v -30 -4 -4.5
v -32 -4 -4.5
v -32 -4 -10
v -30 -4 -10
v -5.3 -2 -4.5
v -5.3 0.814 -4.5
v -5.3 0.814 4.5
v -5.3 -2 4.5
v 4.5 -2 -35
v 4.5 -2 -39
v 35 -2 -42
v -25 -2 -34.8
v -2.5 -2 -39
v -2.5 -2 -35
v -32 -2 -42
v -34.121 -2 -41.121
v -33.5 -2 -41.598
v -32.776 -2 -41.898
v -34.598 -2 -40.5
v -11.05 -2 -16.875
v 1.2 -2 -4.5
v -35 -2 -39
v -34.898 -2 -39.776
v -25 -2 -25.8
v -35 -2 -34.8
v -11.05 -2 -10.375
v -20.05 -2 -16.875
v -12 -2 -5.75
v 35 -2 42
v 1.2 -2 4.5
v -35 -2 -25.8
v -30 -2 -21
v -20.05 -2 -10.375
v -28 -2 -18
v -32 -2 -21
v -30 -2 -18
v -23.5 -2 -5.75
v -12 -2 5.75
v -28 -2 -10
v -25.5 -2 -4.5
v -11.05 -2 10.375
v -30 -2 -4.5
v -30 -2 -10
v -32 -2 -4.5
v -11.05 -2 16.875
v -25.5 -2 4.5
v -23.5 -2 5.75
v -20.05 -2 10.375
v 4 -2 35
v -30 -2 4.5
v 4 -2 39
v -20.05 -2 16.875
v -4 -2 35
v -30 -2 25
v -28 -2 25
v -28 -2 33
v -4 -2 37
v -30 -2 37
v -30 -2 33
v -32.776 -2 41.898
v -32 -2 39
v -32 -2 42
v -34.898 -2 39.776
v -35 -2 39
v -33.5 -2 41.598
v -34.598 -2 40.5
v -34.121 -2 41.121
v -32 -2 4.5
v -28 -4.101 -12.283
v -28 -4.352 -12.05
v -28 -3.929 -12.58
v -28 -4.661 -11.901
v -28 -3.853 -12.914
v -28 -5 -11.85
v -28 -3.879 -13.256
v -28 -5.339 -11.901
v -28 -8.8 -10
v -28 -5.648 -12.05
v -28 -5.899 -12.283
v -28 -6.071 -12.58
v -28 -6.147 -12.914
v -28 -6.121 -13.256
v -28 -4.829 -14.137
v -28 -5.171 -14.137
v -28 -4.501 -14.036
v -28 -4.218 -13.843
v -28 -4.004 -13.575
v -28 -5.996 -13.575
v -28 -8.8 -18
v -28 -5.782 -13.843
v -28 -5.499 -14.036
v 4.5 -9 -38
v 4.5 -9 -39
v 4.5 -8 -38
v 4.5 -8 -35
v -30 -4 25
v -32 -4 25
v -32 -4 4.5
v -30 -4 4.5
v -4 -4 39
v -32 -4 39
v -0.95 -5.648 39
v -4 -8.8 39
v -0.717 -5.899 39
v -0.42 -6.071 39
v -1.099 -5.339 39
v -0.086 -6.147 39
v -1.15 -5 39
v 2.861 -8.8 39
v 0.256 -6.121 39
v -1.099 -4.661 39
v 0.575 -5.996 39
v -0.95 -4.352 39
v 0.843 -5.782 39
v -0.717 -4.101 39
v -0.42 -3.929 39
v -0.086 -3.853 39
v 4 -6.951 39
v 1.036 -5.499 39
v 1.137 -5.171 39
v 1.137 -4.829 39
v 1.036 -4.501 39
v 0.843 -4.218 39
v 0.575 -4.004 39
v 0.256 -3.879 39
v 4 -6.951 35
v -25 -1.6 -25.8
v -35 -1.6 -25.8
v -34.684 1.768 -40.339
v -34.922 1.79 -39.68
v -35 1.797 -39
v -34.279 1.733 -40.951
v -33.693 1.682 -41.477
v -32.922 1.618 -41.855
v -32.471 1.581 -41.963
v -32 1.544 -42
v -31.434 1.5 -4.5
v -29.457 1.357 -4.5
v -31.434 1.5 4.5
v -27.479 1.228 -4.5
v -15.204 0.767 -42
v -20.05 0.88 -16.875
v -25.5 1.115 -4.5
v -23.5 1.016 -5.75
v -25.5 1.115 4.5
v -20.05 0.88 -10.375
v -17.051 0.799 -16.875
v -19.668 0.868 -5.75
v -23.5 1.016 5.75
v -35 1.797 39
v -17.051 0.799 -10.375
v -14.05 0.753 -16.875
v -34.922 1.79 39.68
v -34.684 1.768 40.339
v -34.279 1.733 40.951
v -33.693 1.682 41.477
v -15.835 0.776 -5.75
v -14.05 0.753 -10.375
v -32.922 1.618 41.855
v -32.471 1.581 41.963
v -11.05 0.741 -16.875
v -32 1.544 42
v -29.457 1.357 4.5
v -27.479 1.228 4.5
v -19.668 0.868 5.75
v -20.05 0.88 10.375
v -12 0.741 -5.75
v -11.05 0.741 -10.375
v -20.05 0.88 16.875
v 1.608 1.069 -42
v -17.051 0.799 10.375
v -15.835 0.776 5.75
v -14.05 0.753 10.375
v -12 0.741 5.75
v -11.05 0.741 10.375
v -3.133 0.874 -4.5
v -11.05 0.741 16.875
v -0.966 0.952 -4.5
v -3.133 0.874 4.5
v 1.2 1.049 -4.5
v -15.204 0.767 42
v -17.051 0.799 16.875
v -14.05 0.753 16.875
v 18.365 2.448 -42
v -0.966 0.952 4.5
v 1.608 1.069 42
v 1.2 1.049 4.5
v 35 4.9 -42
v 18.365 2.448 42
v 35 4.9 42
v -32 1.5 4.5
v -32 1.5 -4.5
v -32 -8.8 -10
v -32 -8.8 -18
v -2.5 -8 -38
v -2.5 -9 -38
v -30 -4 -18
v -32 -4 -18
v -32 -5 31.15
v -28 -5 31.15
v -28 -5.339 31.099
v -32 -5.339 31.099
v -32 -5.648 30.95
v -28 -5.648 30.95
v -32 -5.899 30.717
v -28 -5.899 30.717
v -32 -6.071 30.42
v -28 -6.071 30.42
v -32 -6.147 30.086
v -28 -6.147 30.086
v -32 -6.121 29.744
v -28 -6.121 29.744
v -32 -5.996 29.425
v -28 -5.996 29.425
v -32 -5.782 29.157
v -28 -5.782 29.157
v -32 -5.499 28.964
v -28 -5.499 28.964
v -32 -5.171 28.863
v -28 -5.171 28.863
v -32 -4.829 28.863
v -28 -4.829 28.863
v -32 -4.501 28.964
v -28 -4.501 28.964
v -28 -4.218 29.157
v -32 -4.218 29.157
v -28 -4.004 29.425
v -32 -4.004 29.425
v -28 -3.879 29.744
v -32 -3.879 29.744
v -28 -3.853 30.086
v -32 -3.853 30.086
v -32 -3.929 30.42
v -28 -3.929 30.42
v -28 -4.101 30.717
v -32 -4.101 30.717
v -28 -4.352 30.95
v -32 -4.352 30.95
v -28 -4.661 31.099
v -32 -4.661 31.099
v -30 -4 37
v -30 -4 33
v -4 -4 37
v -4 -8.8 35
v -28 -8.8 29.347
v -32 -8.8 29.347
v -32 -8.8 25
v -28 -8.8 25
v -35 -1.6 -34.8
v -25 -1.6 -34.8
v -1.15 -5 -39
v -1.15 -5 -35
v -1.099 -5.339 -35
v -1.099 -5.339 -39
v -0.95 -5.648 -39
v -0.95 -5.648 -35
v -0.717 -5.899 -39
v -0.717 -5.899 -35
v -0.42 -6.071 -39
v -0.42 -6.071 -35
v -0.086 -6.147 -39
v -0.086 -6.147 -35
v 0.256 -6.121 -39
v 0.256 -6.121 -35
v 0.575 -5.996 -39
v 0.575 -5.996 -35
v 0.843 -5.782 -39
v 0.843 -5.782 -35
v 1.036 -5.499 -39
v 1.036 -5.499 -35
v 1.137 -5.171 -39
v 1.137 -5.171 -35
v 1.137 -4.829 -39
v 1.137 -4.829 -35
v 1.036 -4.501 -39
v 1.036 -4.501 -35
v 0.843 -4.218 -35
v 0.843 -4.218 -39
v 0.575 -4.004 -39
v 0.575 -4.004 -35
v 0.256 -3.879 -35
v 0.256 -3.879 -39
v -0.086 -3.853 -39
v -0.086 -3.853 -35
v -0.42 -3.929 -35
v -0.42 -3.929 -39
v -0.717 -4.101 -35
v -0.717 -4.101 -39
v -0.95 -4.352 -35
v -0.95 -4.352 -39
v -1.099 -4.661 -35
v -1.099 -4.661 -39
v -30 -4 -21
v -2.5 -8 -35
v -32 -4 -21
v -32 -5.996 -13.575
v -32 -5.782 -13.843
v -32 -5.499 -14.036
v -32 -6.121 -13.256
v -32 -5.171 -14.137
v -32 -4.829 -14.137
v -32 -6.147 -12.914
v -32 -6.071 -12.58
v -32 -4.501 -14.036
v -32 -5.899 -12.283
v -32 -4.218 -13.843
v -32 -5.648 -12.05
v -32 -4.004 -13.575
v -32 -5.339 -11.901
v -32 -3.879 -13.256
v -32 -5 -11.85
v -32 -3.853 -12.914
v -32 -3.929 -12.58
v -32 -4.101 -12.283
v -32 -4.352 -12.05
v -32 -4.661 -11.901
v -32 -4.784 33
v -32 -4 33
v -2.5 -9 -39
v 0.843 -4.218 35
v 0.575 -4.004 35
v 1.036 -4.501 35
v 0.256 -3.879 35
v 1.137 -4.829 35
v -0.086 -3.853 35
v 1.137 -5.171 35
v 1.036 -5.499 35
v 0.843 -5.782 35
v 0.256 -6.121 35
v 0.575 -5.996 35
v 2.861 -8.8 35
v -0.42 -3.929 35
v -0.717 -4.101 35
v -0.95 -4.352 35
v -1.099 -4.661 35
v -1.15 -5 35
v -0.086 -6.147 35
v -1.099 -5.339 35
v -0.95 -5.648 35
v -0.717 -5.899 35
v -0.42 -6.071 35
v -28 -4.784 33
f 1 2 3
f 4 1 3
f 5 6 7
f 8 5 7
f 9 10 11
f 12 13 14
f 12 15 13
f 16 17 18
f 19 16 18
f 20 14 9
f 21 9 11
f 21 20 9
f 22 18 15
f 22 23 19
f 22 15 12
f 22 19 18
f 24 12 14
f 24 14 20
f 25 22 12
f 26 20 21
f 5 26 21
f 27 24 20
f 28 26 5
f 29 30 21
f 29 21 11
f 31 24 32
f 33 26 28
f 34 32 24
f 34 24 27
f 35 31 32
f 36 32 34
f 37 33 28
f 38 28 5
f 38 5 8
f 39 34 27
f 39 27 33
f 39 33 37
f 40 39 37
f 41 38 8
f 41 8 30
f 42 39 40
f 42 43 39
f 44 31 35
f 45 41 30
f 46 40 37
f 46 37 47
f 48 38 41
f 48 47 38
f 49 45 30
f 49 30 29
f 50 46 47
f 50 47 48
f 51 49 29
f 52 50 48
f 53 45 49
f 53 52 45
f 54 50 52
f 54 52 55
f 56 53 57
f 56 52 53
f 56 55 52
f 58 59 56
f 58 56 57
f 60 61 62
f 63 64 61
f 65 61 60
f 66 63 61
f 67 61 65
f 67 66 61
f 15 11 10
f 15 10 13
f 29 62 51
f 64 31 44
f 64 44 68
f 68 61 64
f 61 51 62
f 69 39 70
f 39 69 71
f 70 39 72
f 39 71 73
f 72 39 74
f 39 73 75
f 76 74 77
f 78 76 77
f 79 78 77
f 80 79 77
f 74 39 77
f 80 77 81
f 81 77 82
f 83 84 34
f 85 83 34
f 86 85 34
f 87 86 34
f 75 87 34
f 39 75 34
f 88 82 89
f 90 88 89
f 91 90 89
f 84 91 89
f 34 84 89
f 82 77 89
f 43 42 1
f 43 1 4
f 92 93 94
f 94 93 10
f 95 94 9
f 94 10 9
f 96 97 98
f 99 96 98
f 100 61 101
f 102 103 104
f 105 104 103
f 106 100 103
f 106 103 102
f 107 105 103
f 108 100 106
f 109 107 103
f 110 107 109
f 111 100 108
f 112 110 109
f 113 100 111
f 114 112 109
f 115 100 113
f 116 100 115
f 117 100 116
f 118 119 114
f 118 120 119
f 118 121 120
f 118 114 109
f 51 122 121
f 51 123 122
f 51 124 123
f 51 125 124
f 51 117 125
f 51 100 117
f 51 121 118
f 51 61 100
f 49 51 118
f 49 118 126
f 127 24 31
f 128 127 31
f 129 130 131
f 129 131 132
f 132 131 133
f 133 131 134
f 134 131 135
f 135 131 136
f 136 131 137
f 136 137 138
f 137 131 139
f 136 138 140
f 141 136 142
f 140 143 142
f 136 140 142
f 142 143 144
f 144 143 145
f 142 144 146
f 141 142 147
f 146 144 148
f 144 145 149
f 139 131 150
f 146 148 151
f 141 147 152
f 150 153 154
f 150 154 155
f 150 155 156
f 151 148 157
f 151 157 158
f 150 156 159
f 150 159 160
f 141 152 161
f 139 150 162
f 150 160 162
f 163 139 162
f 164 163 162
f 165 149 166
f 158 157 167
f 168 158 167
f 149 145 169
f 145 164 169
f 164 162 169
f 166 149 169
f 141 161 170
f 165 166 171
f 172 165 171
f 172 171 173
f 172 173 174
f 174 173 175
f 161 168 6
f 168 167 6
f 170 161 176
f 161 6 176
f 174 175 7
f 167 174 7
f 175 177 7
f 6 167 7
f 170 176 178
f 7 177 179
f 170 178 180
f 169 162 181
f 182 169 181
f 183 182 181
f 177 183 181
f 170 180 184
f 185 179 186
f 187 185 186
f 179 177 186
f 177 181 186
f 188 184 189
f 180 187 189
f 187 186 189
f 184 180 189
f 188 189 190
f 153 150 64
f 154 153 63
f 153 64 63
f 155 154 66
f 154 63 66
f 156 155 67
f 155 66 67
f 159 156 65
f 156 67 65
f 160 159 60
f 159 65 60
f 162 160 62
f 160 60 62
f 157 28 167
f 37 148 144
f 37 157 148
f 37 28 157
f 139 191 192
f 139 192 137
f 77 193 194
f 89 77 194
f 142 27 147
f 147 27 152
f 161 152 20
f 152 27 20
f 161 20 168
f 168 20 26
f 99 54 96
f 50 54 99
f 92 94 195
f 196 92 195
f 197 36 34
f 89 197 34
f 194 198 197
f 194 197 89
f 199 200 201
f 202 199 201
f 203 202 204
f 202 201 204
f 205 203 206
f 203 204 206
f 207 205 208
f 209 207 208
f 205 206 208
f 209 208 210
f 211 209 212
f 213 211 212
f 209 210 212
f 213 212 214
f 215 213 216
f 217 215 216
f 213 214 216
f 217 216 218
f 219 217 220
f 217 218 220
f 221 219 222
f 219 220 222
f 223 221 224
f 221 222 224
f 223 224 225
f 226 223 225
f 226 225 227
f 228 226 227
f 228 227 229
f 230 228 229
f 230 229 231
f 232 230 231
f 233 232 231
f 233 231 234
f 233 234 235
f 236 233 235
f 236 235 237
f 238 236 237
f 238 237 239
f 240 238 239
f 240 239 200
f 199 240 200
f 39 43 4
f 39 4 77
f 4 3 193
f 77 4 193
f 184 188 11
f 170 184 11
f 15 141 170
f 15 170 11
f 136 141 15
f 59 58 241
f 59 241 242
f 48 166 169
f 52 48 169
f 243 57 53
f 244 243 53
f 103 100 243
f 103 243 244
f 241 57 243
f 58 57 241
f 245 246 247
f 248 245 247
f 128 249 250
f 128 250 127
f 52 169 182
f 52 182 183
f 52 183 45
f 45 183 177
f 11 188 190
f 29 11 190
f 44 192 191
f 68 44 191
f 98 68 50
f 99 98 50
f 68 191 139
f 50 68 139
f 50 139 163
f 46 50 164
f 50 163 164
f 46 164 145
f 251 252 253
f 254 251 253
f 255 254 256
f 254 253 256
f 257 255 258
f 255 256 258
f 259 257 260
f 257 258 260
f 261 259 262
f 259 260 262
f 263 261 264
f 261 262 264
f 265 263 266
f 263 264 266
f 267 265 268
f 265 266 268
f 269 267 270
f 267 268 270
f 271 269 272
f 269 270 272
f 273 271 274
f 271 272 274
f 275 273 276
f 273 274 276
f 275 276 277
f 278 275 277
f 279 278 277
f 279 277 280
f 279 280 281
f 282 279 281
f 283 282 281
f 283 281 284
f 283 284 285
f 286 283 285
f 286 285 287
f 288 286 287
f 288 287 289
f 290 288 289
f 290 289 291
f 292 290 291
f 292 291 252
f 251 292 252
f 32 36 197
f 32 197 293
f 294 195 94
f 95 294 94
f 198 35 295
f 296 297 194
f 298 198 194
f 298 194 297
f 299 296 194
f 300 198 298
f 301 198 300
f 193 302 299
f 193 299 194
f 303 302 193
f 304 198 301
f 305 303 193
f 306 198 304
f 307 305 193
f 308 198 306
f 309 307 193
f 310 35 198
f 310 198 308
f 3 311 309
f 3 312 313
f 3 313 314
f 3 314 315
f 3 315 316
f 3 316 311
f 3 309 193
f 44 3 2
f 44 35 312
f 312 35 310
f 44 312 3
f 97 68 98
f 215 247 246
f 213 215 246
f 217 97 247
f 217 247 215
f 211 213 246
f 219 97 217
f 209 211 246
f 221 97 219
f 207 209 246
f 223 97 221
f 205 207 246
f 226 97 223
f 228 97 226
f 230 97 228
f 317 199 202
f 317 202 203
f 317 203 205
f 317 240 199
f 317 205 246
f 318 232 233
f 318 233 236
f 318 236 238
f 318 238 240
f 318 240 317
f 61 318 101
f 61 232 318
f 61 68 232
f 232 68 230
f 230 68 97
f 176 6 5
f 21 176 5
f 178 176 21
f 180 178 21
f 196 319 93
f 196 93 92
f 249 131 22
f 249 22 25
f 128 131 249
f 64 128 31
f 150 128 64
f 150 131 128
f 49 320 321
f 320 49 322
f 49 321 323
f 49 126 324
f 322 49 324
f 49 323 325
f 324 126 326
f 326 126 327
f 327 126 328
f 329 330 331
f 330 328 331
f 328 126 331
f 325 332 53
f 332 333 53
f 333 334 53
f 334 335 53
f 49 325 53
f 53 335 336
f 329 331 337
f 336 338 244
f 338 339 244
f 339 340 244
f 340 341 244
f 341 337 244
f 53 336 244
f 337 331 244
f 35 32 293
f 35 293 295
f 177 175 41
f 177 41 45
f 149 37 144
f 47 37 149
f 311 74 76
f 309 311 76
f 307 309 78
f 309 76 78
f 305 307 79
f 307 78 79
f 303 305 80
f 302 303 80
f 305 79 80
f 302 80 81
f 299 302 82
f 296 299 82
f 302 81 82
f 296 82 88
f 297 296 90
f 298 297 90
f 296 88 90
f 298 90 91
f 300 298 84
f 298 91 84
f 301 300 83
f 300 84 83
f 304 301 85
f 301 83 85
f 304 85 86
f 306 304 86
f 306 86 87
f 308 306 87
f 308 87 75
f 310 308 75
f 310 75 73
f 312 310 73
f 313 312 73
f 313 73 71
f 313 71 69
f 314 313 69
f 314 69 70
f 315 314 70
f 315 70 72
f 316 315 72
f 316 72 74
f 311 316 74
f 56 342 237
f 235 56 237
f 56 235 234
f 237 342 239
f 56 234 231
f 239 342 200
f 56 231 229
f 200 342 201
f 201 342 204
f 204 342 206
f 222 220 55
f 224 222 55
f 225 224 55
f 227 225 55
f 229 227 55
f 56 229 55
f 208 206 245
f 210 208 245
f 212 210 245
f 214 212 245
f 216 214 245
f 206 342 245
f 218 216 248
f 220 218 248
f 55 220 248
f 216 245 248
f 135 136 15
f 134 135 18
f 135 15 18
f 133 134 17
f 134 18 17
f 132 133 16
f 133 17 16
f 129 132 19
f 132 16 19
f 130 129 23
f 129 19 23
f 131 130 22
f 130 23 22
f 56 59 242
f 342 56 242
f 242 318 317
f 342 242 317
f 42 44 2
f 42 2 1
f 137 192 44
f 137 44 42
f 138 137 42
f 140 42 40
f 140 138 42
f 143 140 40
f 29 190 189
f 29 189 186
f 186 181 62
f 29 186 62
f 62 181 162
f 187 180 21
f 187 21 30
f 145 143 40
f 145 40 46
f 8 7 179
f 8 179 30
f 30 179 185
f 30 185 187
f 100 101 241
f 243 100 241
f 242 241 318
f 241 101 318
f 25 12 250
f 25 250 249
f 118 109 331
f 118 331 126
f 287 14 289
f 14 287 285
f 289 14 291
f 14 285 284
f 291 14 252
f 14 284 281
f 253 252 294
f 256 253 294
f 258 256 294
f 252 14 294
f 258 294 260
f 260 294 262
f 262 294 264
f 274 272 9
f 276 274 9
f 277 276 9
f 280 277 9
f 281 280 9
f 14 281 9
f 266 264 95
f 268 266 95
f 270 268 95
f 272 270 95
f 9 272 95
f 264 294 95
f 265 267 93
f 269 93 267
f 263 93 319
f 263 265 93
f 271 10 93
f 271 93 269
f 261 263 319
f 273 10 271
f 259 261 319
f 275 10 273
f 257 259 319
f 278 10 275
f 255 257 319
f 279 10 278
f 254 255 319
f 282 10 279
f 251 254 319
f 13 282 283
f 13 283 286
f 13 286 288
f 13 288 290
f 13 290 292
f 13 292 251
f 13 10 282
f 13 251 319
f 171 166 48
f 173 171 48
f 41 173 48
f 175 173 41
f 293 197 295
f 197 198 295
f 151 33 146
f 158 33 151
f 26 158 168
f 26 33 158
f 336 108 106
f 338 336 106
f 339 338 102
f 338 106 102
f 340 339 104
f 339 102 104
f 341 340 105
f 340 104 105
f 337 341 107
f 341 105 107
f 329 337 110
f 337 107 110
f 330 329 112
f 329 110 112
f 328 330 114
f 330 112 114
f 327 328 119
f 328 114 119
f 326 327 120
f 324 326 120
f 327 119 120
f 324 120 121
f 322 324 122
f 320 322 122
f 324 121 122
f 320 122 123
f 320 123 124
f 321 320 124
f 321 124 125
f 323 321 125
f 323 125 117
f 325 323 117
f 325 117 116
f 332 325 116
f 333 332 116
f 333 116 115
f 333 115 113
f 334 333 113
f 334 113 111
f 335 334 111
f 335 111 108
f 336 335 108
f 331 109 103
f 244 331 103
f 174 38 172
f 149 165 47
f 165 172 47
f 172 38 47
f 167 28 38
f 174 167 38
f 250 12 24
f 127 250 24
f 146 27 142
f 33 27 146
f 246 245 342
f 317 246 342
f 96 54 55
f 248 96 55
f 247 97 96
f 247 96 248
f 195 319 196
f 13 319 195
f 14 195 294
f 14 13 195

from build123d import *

# Parameters (mm, degrees)
SKETCH009_W             = 84
SKETCH009_H             = 70
PAD002_DEPTH            = 2
SKETCH010_W             = 2
SKETCH010_H             = 7
PAD003_DEPTH            = 2
SKETCH012_W             = 8
SKETCH012_H             = 6.8
PAD004_DEPTH            = 4
SKETCH013_W             = 7
SKETCH013_H             = 6
PAD005_DEPTH            = 4
SKETCH011_W             = 8
SKETCH011_H             = 6.8
PAD006_DEPTH            = 4
SKETCH014_R             = 1.15
POCKET002_DEPTH         = 81.001
SKETCH016_R             = 1.15
POCKET003_DEPTH         = 8.501
SKETCH018_W             = 11.5
SKETCH018_H             = 11.5
POCKET004_DEPTH         = 5
POCKET005_DEPTH         = 5
POCKET006_DEPTH         = 5
SKETCH021_W             = 1
SKETCH021_H             = 7
PAD007_DEPTH            = 1
SKETCH022_W             = 9
SKETCH022_H             = 10
POCKET007_DEPTH         = 0.4
FILLET_R                = 3
BODY002_PITCH_ANGLE     = -90
BODY002_PLACEMENT_ANGLE = 90
PAD001_DEPTH            = 42
SKETCH007_W             = 11.5
SKETCH007_H             = 11.5
POCKET001_DEPTH         = 13
FILLET001_R             = 3
SKETCH025_W             = 6.5
SKETCH025_H             = 9
SKETCH025_W_2           = 9
SKETCH025_H_2           = 6.5
POCKET008_DEPTH         = 3.5


with BuildPart() as back:
    # Sketch009 → Pad002 (new body)
    with BuildSketch(Plane.XY):
        Rectangle(SKETCH009_W, SKETCH009_H)
    extrude(amount=PAD002_DEPTH)

    # Sketch010 (on Face6 of Pad002) → Pad003 (join)
    with BuildSketch(Plane.XY.offset(2)):
        with Locations((-38, -1)):
            Rectangle(SKETCH010_W, SKETCH010_H)
        Polygon((-21, 32), (39, 32), (39, -4), (37, -4), (37, 30), (-21, 30), align=None)
    extrude(amount=PAD003_DEPTH)

    # Sketch012 (on Face15 of Pad003) → Pad004 (join)
    with BuildSketch(Plane.YZ.offset(39)):
        with Locations((0, 5.4)):
            Rectangle(SKETCH012_W, SKETCH012_H)
    extrude(amount=-PAD004_DEPTH)

    # Sketch013 (on Face9 of Pad004) → Pad005 (join)
    with BuildSketch(Plane(origin=(-39, 0, 0), x_dir=(0, -1, 0), z_dir=(-1, 0, 0))):
        with Locations((1, 5)):
            Rectangle(SKETCH013_W, SKETCH013_H)
    extrude(amount=-PAD005_DEPTH)

    # Sketch011 (on Face16 of Pad003) → Pad006 (join)
    with BuildSketch(Plane(origin=(0, 32, 0), x_dir=(-1, 0, 0), z_dir=(0, 1, 0))):
        with Locations((-29, 5.4)):
            Rectangle(SKETCH011_W, SKETCH011_H)
        with Locations((14, 5.4)):
            Rectangle(SKETCH011_W, SKETCH011_H)
    extrude(amount=-PAD006_DEPTH)

    # Sketch014 (on Face44 of Pad006) → Pocket002 (cut, through all)
    with BuildSketch(Plane.YZ.offset(39)):
        with Locations((0, 5)):
            Circle(SKETCH014_R)
    extrude(amount=-POCKET002_DEPTH, mode=Mode.SUBTRACT)

    # Sketch016 → Pocket003 (cut, through all)
    with BuildSketch(Plane.XZ.offset(-26.5)):
        with Locations((-13, 5)):
            Circle(SKETCH016_R)
        with Locations((30, 5)):
            Circle(SKETCH016_R)
    extrude(amount=-POCKET003_DEPTH, mode=Mode.SUBTRACT)

    # Sketch018 (on Face5 of Pocket003) → Pocket004 (cut)
    with BuildSketch(Plane.XY.offset(2)):
        with Locations((0, 17.75)):
            Rectangle(SKETCH018_W, SKETCH018_H)
    extrude(amount=-POCKET004_DEPTH, mode=Mode.SUBTRACT)

    # Sketch019 (on Face31 of Pocket004) → Pocket005 (cut)
    with BuildSketch(Plane.XZ.offset(-28)):
        Polygon((29.125944, 9.042901), (33.258869, 4.499726), (33.258869, 9.042901), align=None)
    extrude(amount=-POCKET005_DEPTH, mode=Mode.SUBTRACT)

    # Sketch020 (on Face36 of Pocket005) → Pocket006 (cut)
    with BuildSketch(Plane(origin=(35, 0, 0), x_dir=(0, -1, 0), z_dir=(-1, 0, 0))):
        Polygon((2.77547, 8.938441), (6.386171, 3.079567), (6.386171, 8.938441), align=None)
    extrude(amount=-POCKET006_DEPTH, mode=Mode.SUBTRACT)

    # Sketch021 (on Face40 of Pocket006) → Pad007 (join)
    with BuildSketch(Plane.XY.offset(8)):
        with Locations((-38.5, -1)):
            Rectangle(SKETCH021_W, SKETCH021_H)
    extrude(amount=PAD007_DEPTH)

    # Sketch022 (on Face5 of Pocket005) → Pocket007 (cut)
    with BuildSketch(Plane.XY.offset(2)):
        with Locations((-30.3, 30)):
            Rectangle(SKETCH022_W, SKETCH022_H)
    extrude(amount=-POCKET007_DEPTH, mode=Mode.SUBTRACT)

    # Fillet
    fillet_edges = [back.edges().sort_by_distance(p)[0] for p in [
        (42, 35, 1),
        (-42, 35, 1),
    ]]
    fillet(fillet_edges, radius=FILLET_R)


with BuildPart() as back_1:
    # Body002 pitch: moved
    add(back.part.rotate(Axis((0, 0, 0), (0, 1, 0)), BODY002_PITCH_ANGLE))


with BuildPart() as back_2:
    # Body002 placement: moved
    add(back_1.part.rotate(Axis((0, 0, 0), (0, 0, 1)), BODY002_PLACEMENT_ANGLE))


with BuildPart() as curve:
    # Sketch006 → Pad001 (new body, symmetric)
    with BuildSketch(Plane.XY):
        with BuildLine():
            ThreePointArc((-35, 1.796592), (0.104214, 0.997658), (35, 4.9))
            Line((35, -0.1), (35, 4.9))
            Line((-35, -0.1), (35, -0.1))
            Line((-35, 1.796592), (-35, -0.1))
        make_face()
    extrude(amount=PAD001_DEPTH, both=True)

    # Sketch007 (on Face3 of Pad001) → Pocket001 (cut)
    with BuildSketch(Plane.XZ.offset(0.1)):
        with Locations((-17.75, 0)):
            Rectangle(SKETCH007_W, SKETCH007_H)
    extrude(amount=-POCKET001_DEPTH, mode=Mode.SUBTRACT)

    # Fillet001
    fillet001_edges = [curve.edges().sort_by_distance(p)[0] for p in [
        (-35, 0.848296, -42),
        (-35, 0.848296, 42),
    ]]
    fillet(fillet001_edges, radius=FILLET001_R)

    # Boolean: union Back
    add(back_2.part)

    # Sketch025 (on Face32 of Boolean) → Pocket008 (cut, symmetric)
    with BuildSketch(Plane.XZ.offset(2)):
        with Locations((-28.75, 0)):
            Rectangle(SKETCH025_W, SKETCH025_H)
        with Locations((-15.55, 13.625)):
            Rectangle(SKETCH025_W_2, SKETCH025_H_2)
        with Locations((-2.05, 0)):
            Rectangle(SKETCH025_W, SKETCH025_H)
        with Locations((-15.55, -13.625)):
            Rectangle(SKETCH025_W_2, SKETCH025_H_2)
    extrude(amount=POCKET008_DEPTH, both=True, mode=Mode.SUBTRACT)


solid = curve.part
